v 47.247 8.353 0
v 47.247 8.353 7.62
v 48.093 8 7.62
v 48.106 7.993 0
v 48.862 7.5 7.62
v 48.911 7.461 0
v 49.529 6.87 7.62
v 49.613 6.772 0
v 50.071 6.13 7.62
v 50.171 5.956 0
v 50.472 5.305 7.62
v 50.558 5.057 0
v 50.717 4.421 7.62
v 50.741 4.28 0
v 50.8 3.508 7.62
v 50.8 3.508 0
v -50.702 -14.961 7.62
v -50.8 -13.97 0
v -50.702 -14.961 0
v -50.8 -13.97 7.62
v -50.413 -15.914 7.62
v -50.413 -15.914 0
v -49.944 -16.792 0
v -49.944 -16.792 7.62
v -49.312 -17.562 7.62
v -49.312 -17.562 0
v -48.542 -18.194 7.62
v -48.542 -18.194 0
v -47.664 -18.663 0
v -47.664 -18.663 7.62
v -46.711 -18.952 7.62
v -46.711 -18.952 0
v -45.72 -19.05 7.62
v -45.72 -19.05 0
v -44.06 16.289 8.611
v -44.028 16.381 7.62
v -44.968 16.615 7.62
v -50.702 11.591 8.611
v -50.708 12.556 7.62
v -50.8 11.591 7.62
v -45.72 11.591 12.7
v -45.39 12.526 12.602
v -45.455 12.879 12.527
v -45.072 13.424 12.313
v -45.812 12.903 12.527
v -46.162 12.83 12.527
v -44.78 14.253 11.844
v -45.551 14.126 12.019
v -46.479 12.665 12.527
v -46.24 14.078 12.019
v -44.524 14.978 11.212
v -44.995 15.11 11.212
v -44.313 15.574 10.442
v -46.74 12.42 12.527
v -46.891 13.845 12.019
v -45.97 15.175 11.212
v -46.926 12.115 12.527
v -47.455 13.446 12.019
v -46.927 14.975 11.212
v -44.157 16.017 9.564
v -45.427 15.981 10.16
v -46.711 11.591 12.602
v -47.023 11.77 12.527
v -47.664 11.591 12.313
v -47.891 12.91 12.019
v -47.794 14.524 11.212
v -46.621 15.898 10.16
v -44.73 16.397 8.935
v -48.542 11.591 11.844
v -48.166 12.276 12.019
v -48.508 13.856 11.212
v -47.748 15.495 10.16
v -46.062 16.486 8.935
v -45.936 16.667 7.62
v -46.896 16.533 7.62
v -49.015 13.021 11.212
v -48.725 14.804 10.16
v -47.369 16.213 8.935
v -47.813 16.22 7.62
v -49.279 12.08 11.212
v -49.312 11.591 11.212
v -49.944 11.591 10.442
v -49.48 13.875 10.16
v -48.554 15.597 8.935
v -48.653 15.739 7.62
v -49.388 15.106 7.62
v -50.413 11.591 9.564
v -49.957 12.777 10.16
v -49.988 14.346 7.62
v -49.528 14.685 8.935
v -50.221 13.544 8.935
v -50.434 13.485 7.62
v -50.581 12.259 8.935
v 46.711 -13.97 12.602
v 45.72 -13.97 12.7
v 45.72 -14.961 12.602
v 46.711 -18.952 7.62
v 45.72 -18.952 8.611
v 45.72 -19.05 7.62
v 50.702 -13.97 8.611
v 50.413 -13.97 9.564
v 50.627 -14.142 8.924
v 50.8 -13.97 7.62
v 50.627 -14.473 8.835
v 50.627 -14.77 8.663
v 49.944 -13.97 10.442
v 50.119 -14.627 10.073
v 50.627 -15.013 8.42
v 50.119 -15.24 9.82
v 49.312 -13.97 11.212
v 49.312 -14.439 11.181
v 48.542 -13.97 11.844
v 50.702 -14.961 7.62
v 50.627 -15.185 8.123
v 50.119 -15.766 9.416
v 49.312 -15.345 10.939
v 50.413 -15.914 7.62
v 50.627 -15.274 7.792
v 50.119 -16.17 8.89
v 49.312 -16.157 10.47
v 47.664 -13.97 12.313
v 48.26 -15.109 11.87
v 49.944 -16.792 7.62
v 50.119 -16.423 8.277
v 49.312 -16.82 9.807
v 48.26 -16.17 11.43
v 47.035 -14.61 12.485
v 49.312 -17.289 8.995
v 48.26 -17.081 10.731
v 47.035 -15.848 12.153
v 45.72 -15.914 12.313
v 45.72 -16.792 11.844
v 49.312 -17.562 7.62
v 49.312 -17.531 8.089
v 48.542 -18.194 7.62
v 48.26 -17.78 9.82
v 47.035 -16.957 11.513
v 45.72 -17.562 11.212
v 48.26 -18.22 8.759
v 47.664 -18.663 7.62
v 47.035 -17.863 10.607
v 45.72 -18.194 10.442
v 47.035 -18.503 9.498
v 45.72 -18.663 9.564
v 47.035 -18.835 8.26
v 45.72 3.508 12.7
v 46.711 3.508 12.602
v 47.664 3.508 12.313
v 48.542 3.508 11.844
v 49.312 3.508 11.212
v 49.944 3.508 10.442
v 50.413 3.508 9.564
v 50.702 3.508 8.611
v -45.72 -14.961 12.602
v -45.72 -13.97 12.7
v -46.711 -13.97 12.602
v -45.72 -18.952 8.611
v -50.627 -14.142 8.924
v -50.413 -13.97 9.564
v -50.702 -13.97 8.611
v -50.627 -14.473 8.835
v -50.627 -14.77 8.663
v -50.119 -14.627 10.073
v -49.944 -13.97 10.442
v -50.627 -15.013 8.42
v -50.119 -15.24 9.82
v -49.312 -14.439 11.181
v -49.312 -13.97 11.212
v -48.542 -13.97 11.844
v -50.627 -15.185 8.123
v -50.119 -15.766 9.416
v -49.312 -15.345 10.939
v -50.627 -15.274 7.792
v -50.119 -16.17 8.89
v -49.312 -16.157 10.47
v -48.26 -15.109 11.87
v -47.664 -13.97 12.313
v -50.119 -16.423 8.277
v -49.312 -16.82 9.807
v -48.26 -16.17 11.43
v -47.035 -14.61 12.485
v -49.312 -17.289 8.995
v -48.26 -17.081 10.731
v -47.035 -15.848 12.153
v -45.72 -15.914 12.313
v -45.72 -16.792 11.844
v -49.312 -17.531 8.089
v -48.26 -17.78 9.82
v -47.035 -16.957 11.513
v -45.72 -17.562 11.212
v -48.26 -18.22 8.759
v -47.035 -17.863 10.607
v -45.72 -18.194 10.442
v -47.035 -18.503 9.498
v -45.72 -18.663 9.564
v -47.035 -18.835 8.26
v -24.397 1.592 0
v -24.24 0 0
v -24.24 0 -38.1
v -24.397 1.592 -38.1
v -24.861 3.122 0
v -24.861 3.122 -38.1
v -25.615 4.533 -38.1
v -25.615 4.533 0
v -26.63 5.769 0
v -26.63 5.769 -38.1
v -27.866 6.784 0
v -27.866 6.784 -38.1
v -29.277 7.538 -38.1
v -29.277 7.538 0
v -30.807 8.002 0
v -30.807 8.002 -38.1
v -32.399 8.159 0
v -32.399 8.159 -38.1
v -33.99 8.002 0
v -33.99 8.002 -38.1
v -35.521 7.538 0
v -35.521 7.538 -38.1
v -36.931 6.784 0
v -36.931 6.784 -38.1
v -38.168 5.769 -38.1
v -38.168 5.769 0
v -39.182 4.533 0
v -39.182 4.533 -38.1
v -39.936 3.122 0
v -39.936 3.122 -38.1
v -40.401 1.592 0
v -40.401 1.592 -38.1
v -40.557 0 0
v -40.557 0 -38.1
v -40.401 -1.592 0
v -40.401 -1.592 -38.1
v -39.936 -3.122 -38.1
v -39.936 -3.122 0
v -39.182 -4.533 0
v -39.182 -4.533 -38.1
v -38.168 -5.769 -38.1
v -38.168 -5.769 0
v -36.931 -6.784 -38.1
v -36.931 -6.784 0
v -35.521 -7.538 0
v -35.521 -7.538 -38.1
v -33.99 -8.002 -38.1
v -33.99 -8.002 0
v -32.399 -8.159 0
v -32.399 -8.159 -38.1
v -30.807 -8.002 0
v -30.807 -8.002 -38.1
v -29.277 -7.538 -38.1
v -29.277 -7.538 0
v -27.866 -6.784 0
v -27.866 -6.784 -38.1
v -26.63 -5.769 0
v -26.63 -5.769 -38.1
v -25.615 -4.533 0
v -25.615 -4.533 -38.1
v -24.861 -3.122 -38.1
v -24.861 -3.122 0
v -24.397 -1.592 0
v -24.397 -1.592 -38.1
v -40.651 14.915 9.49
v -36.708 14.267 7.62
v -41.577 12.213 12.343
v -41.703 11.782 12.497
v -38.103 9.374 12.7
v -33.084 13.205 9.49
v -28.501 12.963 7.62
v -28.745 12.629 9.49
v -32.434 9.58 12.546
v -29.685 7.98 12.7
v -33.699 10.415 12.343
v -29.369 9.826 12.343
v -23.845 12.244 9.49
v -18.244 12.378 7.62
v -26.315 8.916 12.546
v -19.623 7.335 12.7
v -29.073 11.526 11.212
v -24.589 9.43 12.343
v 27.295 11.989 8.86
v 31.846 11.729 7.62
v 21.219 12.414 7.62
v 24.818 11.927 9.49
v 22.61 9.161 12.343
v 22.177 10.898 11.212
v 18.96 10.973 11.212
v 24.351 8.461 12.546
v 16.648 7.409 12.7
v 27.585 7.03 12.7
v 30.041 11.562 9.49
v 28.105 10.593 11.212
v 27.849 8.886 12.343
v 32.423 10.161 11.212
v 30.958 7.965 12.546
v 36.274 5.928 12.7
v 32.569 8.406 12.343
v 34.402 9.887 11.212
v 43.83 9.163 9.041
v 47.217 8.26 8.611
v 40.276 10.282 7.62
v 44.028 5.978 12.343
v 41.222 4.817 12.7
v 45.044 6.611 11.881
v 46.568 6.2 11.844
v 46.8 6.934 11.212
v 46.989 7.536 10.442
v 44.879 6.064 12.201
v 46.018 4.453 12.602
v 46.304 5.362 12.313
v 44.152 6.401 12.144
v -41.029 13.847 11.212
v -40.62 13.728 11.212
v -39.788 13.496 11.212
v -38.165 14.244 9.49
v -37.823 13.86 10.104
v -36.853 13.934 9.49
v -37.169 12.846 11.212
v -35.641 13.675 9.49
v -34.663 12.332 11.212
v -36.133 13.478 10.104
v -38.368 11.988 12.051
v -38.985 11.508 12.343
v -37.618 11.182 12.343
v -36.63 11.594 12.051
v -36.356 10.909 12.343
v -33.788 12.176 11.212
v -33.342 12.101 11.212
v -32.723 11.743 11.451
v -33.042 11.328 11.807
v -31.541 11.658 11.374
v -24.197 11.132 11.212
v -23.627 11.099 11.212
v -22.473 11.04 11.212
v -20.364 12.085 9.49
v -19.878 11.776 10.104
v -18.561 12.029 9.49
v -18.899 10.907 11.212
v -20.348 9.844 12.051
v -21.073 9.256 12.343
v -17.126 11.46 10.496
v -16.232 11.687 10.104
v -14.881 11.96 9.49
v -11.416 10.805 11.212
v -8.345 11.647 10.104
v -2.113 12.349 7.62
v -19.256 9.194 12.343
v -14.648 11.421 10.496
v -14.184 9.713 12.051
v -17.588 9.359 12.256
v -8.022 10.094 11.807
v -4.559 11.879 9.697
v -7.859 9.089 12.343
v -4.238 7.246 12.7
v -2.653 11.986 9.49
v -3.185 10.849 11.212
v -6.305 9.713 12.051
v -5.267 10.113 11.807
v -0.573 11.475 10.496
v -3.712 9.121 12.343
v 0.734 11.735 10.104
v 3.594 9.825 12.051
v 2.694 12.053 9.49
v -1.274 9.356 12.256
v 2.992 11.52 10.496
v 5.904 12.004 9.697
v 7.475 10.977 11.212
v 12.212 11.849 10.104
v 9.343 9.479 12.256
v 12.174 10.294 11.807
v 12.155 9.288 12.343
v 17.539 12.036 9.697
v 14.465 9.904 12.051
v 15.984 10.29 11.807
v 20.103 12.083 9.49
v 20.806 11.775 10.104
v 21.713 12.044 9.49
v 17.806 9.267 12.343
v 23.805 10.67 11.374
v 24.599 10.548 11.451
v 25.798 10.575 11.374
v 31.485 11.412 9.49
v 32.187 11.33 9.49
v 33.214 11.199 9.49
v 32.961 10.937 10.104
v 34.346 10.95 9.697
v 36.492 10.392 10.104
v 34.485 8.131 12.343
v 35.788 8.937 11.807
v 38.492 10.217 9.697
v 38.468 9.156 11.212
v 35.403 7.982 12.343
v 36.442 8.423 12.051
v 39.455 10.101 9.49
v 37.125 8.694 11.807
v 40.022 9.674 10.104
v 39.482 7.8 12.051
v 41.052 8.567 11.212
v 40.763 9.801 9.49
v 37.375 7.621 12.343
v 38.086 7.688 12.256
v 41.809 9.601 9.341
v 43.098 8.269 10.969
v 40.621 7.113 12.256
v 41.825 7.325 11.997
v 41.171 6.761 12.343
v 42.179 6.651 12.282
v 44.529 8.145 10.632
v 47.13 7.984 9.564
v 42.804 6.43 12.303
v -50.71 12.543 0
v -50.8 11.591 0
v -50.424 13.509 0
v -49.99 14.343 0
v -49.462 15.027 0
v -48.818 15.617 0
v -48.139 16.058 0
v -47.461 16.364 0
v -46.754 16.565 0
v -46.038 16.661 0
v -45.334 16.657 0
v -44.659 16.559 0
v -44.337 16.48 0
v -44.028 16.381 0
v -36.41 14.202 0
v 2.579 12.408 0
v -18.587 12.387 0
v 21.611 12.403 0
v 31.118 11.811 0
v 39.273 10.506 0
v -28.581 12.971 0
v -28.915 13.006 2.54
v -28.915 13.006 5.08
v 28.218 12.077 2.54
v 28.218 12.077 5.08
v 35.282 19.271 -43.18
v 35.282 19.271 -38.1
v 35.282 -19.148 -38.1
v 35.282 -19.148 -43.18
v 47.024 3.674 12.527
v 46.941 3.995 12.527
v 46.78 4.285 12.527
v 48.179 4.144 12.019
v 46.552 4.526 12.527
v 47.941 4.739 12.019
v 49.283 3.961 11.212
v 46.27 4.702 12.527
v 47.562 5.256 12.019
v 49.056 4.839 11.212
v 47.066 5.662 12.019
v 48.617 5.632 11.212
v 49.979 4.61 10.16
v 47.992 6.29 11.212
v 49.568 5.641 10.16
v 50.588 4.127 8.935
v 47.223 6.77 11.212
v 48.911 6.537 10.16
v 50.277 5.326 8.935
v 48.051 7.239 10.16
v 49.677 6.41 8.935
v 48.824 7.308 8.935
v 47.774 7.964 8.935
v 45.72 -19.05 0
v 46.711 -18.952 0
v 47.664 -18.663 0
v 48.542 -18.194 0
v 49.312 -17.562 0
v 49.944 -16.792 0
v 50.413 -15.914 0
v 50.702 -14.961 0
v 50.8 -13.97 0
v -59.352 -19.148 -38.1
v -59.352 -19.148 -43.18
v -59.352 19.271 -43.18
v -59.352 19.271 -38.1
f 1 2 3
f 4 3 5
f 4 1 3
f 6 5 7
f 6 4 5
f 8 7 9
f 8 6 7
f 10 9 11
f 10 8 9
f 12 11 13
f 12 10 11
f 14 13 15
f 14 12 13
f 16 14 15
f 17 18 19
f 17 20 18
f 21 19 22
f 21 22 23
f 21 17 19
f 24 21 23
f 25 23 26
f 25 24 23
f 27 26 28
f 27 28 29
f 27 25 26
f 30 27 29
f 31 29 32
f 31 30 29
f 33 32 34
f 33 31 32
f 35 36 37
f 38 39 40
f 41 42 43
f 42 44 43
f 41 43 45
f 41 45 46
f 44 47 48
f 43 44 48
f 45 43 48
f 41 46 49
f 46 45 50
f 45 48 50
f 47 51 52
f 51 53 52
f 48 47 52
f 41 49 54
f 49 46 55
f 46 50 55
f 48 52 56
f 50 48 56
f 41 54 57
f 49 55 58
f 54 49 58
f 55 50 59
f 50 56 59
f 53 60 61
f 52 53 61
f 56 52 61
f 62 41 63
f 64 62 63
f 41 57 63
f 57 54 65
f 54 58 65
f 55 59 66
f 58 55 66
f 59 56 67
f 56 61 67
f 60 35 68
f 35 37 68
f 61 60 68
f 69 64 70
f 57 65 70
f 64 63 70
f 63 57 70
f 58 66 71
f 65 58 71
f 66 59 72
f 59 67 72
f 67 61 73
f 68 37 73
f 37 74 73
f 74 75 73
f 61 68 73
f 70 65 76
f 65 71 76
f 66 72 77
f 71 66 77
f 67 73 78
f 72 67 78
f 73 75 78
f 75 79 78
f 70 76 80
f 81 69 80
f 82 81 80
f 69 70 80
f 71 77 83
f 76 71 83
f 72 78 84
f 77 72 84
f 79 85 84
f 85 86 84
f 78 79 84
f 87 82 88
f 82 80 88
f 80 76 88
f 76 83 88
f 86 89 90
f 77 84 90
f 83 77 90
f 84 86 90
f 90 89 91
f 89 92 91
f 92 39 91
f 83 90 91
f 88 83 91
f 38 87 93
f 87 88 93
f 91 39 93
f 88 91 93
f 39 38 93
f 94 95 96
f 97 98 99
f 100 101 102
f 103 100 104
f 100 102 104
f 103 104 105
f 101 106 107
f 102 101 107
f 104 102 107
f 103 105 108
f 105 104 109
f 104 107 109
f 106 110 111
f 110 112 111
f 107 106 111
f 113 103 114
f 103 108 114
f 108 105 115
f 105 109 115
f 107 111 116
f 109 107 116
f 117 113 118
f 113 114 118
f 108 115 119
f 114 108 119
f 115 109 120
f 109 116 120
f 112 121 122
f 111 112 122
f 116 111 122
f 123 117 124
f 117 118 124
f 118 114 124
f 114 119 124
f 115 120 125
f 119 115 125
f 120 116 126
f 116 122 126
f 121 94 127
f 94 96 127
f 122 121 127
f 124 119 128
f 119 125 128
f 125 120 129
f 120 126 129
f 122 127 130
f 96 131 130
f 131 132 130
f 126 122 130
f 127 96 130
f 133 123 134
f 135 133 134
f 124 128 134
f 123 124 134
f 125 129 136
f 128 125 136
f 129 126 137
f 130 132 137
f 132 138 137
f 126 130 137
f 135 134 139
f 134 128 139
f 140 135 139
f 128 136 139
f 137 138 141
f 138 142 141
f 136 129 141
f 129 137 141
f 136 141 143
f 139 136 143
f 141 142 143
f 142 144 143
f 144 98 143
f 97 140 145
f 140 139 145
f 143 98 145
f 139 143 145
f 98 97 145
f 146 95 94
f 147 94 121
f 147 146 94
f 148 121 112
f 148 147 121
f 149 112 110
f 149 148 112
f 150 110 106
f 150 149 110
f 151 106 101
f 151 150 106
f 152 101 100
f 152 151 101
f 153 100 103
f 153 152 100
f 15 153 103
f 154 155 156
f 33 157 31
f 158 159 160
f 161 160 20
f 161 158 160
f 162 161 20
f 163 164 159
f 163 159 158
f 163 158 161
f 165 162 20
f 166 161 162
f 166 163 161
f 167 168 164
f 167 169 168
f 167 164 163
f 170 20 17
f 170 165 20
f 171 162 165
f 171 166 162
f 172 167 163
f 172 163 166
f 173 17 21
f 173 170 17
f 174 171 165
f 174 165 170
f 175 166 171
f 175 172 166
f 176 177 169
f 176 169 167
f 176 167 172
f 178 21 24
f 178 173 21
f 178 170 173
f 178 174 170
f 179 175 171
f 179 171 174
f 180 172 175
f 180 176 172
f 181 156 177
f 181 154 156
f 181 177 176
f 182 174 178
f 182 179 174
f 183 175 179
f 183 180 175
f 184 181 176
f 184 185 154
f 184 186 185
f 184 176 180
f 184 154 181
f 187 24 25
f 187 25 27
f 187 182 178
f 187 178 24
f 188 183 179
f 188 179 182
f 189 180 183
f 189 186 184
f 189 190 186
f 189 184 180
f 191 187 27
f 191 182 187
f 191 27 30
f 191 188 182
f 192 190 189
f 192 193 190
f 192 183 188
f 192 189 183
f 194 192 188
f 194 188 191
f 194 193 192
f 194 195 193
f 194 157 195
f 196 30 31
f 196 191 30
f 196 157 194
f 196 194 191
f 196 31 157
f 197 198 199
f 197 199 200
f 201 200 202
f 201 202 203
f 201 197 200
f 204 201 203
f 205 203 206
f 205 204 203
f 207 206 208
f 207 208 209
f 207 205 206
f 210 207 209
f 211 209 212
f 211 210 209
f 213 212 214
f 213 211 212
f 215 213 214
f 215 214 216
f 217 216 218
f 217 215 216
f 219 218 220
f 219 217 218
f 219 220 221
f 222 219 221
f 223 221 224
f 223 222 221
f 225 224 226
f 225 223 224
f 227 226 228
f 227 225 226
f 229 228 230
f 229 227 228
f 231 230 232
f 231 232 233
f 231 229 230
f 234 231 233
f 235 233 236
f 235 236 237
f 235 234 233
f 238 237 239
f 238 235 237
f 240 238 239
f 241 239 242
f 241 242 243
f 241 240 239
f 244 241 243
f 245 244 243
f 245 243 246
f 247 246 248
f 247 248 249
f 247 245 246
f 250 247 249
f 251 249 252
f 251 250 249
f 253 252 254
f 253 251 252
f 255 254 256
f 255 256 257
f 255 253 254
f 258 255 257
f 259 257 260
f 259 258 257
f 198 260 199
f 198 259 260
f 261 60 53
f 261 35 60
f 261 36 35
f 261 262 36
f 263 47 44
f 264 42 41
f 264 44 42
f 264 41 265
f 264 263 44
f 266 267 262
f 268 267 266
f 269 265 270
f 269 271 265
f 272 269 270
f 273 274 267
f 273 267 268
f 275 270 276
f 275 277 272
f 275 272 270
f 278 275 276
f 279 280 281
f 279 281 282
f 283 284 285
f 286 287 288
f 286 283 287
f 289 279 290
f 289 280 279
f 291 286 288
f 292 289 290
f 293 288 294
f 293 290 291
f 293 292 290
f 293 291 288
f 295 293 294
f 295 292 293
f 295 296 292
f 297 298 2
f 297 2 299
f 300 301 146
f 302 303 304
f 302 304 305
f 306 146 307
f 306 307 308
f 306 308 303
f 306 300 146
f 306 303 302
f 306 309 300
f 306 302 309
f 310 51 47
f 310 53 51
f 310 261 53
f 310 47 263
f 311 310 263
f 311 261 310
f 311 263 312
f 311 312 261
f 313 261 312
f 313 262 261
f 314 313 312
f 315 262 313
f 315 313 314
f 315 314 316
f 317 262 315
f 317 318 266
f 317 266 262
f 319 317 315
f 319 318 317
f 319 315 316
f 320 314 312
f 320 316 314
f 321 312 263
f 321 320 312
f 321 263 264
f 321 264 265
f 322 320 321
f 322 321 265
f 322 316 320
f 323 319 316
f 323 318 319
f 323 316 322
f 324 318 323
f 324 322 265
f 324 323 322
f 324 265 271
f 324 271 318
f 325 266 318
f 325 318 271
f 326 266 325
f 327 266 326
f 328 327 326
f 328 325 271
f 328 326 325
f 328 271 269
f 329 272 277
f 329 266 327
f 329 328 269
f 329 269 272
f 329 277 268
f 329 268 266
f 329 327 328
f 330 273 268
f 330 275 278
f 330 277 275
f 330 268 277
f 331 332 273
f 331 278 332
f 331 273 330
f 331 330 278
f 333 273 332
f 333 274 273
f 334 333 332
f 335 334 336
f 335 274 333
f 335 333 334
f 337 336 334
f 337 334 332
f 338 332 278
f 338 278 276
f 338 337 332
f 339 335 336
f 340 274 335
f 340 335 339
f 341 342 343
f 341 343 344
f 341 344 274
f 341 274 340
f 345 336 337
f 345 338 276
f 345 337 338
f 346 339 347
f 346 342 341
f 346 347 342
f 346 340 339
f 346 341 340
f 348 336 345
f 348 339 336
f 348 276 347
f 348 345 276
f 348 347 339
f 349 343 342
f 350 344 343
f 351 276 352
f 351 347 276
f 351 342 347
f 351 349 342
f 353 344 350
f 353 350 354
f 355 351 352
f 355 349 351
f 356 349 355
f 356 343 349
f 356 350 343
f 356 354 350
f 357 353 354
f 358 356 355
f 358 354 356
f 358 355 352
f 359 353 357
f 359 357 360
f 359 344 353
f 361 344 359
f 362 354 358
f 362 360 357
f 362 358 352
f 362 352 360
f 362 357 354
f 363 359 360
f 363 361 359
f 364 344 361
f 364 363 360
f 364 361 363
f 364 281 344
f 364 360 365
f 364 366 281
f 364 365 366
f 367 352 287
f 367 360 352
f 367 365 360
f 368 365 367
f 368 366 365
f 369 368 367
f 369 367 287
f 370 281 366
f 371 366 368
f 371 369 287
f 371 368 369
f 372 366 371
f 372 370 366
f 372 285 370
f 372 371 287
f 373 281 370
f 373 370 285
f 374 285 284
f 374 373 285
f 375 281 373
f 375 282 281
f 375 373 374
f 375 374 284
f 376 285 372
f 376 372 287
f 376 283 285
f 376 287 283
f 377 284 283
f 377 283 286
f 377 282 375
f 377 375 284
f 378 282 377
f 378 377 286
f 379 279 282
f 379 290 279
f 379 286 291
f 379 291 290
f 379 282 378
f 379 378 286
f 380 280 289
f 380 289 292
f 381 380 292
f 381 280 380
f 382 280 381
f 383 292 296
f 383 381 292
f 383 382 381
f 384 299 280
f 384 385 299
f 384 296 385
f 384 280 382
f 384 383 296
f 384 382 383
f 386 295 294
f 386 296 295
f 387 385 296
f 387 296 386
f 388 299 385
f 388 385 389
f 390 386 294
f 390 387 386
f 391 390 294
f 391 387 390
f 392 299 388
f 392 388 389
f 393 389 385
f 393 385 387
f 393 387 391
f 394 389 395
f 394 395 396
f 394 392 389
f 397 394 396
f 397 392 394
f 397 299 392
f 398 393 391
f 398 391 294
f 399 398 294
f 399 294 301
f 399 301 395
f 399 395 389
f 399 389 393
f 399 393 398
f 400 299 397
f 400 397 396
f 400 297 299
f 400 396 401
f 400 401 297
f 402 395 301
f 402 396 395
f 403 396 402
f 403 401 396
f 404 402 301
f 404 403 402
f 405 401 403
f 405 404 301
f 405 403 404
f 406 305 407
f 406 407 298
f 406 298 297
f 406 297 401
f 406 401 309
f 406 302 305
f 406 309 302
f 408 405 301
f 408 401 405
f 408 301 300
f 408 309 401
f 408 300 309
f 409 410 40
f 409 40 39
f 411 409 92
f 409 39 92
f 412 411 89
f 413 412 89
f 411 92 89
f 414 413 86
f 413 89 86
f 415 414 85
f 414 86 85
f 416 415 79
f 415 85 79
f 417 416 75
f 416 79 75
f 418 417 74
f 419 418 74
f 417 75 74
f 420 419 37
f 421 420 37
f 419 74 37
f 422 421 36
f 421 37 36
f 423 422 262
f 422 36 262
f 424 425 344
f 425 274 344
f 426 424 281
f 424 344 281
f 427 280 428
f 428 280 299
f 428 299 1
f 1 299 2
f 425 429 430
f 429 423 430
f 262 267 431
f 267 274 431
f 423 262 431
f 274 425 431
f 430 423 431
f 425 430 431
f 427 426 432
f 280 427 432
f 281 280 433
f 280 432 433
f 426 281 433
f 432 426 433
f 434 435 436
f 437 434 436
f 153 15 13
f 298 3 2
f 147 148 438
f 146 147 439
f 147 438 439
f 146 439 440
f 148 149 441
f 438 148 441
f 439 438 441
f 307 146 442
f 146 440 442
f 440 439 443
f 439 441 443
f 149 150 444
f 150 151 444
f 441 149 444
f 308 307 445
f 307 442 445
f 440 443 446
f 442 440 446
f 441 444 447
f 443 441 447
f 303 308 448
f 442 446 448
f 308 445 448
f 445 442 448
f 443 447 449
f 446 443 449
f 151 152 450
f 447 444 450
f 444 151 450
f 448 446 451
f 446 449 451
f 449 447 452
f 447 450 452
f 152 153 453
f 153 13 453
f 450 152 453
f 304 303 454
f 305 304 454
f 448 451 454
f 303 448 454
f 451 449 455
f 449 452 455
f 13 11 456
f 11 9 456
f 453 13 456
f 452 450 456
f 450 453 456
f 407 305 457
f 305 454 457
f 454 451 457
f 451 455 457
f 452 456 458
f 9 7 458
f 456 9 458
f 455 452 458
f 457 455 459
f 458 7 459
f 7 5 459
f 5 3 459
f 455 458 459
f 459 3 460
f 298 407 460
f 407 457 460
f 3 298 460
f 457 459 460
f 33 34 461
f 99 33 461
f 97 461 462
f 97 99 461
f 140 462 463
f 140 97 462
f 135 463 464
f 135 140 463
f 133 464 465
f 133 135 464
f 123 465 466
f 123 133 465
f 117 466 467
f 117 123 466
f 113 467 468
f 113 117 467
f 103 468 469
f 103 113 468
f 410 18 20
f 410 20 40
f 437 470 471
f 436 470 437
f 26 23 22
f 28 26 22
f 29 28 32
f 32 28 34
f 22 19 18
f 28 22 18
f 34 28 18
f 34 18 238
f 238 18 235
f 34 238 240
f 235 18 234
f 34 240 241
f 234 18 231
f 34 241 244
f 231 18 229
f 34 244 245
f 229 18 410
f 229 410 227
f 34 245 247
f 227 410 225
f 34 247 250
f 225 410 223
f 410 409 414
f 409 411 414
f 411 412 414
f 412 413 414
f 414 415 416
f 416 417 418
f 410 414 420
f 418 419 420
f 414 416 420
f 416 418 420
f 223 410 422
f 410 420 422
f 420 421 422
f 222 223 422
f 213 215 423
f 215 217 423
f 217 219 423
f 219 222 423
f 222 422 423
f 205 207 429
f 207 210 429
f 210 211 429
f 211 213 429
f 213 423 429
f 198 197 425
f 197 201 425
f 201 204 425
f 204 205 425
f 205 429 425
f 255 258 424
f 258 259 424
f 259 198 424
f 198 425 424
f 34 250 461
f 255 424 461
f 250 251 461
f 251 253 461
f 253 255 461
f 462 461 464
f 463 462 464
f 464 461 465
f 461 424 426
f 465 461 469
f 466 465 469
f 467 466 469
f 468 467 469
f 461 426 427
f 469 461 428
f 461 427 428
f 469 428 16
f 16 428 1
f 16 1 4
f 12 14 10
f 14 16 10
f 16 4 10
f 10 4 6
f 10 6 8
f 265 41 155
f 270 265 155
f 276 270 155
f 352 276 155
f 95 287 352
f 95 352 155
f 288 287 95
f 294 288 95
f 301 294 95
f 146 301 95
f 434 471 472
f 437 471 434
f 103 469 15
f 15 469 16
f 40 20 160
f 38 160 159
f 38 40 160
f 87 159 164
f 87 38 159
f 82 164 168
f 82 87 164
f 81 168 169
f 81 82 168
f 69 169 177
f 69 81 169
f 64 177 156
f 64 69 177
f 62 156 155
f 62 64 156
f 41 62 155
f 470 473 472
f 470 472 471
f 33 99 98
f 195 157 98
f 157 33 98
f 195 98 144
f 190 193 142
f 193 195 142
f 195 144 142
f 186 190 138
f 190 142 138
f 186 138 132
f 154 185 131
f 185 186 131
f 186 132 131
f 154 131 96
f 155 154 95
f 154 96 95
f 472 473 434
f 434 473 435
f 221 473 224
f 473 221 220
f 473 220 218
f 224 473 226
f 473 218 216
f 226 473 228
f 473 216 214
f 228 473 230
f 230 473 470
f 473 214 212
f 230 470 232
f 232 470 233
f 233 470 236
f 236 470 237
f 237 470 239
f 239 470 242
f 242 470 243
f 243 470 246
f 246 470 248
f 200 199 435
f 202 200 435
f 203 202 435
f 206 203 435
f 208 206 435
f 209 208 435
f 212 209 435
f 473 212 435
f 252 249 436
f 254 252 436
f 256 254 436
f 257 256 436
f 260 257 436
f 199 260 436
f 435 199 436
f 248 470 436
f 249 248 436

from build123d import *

# Parameters (mm, degrees)
F0_W     = 101.6
F0_H     = 38.1
F1_DEPTH = 12.7
F3_DEPTH = 25.4
F4_R     = 5.08
F5_R     = 8.1585403427
F6_DEPTH = 38.1
F7_W     = 94.6341231465
F7_H     = 38.4192988276
F8_DEPTH = 5.08


# Not quite as in the source:
# - two fillets or chamfers of one size are made in one step


with BuildPart() as f1:
    # F0 (on Top) → F1 (new body)
    with BuildSketch(Plane.XY):
        Rectangle(F0_W, F0_H)
    extrude(amount=F1_DEPTH)

    # F2 (on face) → F3 (cut)
    with BuildSketch(Plane.XY.offset(12.7)):
        with BuildLine():
            Line((-50.8, 29.4957049191), (-50.8, 19.05))
            add(Edge.make_bspline(
                [(-50.8, 19.05), (-44.8058190597, 16.5548569949), (-29.3022913601, 10.1013449841), (28.5345191575, 14.5340371651), (44.5678818935, 9.2526124329), (50.8, 7.199739106)],
                knots=[0, 0, 0, 0, 0.2781516974, 0.7194198154, 1, 1, 1, 1], degree=3))
            Line((50.8, 7.199739106), (51.4432899654, 29.4957049191))
            Line((51.4432899654, 29.4957049191), (-50.8, 29.4957049191))
        make_face()
    extrude(amount=-F3_DEPTH, mode=Mode.SUBTRACT)

    # F4
    f4_edges = [f1.edges().sort_by_distance(p)[0] for p in [
        (0, -19.05, 12.7),
        (50.8, -5.92513, 12.7),
        (-0.16927, 12.372824, 12.7),
        (-50.8, 0, 12.7),
        (-50.8, 19.05, 6.35),
        (-50.8, -19.05, 6.35),
        (50.8, 7.199739, 6.35),
        (50.8, -19.05, 6.35),
    ]]
    fillet(f4_edges, radius=F4_R)

    # F5 (on Top) → F6 (join)
    with BuildSketch(Plane.XY):
        with Locations((-32.3988236487, 0)):
            Circle(F5_R)
    extrude(amount=-F6_DEPTH)

    # F7 (on face) → F8 (join)
    with BuildSketch(Plane(origin=(0, 0, -38.1), x_dir=(1, 0, 0), z_dir=(0, 0, -1))):
        with Locations((-12.0352953672, -0.0617783517)):
            Rectangle(F7_W, F7_H)
    extrude(amount=F8_DEPTH)


solid = f1.part
